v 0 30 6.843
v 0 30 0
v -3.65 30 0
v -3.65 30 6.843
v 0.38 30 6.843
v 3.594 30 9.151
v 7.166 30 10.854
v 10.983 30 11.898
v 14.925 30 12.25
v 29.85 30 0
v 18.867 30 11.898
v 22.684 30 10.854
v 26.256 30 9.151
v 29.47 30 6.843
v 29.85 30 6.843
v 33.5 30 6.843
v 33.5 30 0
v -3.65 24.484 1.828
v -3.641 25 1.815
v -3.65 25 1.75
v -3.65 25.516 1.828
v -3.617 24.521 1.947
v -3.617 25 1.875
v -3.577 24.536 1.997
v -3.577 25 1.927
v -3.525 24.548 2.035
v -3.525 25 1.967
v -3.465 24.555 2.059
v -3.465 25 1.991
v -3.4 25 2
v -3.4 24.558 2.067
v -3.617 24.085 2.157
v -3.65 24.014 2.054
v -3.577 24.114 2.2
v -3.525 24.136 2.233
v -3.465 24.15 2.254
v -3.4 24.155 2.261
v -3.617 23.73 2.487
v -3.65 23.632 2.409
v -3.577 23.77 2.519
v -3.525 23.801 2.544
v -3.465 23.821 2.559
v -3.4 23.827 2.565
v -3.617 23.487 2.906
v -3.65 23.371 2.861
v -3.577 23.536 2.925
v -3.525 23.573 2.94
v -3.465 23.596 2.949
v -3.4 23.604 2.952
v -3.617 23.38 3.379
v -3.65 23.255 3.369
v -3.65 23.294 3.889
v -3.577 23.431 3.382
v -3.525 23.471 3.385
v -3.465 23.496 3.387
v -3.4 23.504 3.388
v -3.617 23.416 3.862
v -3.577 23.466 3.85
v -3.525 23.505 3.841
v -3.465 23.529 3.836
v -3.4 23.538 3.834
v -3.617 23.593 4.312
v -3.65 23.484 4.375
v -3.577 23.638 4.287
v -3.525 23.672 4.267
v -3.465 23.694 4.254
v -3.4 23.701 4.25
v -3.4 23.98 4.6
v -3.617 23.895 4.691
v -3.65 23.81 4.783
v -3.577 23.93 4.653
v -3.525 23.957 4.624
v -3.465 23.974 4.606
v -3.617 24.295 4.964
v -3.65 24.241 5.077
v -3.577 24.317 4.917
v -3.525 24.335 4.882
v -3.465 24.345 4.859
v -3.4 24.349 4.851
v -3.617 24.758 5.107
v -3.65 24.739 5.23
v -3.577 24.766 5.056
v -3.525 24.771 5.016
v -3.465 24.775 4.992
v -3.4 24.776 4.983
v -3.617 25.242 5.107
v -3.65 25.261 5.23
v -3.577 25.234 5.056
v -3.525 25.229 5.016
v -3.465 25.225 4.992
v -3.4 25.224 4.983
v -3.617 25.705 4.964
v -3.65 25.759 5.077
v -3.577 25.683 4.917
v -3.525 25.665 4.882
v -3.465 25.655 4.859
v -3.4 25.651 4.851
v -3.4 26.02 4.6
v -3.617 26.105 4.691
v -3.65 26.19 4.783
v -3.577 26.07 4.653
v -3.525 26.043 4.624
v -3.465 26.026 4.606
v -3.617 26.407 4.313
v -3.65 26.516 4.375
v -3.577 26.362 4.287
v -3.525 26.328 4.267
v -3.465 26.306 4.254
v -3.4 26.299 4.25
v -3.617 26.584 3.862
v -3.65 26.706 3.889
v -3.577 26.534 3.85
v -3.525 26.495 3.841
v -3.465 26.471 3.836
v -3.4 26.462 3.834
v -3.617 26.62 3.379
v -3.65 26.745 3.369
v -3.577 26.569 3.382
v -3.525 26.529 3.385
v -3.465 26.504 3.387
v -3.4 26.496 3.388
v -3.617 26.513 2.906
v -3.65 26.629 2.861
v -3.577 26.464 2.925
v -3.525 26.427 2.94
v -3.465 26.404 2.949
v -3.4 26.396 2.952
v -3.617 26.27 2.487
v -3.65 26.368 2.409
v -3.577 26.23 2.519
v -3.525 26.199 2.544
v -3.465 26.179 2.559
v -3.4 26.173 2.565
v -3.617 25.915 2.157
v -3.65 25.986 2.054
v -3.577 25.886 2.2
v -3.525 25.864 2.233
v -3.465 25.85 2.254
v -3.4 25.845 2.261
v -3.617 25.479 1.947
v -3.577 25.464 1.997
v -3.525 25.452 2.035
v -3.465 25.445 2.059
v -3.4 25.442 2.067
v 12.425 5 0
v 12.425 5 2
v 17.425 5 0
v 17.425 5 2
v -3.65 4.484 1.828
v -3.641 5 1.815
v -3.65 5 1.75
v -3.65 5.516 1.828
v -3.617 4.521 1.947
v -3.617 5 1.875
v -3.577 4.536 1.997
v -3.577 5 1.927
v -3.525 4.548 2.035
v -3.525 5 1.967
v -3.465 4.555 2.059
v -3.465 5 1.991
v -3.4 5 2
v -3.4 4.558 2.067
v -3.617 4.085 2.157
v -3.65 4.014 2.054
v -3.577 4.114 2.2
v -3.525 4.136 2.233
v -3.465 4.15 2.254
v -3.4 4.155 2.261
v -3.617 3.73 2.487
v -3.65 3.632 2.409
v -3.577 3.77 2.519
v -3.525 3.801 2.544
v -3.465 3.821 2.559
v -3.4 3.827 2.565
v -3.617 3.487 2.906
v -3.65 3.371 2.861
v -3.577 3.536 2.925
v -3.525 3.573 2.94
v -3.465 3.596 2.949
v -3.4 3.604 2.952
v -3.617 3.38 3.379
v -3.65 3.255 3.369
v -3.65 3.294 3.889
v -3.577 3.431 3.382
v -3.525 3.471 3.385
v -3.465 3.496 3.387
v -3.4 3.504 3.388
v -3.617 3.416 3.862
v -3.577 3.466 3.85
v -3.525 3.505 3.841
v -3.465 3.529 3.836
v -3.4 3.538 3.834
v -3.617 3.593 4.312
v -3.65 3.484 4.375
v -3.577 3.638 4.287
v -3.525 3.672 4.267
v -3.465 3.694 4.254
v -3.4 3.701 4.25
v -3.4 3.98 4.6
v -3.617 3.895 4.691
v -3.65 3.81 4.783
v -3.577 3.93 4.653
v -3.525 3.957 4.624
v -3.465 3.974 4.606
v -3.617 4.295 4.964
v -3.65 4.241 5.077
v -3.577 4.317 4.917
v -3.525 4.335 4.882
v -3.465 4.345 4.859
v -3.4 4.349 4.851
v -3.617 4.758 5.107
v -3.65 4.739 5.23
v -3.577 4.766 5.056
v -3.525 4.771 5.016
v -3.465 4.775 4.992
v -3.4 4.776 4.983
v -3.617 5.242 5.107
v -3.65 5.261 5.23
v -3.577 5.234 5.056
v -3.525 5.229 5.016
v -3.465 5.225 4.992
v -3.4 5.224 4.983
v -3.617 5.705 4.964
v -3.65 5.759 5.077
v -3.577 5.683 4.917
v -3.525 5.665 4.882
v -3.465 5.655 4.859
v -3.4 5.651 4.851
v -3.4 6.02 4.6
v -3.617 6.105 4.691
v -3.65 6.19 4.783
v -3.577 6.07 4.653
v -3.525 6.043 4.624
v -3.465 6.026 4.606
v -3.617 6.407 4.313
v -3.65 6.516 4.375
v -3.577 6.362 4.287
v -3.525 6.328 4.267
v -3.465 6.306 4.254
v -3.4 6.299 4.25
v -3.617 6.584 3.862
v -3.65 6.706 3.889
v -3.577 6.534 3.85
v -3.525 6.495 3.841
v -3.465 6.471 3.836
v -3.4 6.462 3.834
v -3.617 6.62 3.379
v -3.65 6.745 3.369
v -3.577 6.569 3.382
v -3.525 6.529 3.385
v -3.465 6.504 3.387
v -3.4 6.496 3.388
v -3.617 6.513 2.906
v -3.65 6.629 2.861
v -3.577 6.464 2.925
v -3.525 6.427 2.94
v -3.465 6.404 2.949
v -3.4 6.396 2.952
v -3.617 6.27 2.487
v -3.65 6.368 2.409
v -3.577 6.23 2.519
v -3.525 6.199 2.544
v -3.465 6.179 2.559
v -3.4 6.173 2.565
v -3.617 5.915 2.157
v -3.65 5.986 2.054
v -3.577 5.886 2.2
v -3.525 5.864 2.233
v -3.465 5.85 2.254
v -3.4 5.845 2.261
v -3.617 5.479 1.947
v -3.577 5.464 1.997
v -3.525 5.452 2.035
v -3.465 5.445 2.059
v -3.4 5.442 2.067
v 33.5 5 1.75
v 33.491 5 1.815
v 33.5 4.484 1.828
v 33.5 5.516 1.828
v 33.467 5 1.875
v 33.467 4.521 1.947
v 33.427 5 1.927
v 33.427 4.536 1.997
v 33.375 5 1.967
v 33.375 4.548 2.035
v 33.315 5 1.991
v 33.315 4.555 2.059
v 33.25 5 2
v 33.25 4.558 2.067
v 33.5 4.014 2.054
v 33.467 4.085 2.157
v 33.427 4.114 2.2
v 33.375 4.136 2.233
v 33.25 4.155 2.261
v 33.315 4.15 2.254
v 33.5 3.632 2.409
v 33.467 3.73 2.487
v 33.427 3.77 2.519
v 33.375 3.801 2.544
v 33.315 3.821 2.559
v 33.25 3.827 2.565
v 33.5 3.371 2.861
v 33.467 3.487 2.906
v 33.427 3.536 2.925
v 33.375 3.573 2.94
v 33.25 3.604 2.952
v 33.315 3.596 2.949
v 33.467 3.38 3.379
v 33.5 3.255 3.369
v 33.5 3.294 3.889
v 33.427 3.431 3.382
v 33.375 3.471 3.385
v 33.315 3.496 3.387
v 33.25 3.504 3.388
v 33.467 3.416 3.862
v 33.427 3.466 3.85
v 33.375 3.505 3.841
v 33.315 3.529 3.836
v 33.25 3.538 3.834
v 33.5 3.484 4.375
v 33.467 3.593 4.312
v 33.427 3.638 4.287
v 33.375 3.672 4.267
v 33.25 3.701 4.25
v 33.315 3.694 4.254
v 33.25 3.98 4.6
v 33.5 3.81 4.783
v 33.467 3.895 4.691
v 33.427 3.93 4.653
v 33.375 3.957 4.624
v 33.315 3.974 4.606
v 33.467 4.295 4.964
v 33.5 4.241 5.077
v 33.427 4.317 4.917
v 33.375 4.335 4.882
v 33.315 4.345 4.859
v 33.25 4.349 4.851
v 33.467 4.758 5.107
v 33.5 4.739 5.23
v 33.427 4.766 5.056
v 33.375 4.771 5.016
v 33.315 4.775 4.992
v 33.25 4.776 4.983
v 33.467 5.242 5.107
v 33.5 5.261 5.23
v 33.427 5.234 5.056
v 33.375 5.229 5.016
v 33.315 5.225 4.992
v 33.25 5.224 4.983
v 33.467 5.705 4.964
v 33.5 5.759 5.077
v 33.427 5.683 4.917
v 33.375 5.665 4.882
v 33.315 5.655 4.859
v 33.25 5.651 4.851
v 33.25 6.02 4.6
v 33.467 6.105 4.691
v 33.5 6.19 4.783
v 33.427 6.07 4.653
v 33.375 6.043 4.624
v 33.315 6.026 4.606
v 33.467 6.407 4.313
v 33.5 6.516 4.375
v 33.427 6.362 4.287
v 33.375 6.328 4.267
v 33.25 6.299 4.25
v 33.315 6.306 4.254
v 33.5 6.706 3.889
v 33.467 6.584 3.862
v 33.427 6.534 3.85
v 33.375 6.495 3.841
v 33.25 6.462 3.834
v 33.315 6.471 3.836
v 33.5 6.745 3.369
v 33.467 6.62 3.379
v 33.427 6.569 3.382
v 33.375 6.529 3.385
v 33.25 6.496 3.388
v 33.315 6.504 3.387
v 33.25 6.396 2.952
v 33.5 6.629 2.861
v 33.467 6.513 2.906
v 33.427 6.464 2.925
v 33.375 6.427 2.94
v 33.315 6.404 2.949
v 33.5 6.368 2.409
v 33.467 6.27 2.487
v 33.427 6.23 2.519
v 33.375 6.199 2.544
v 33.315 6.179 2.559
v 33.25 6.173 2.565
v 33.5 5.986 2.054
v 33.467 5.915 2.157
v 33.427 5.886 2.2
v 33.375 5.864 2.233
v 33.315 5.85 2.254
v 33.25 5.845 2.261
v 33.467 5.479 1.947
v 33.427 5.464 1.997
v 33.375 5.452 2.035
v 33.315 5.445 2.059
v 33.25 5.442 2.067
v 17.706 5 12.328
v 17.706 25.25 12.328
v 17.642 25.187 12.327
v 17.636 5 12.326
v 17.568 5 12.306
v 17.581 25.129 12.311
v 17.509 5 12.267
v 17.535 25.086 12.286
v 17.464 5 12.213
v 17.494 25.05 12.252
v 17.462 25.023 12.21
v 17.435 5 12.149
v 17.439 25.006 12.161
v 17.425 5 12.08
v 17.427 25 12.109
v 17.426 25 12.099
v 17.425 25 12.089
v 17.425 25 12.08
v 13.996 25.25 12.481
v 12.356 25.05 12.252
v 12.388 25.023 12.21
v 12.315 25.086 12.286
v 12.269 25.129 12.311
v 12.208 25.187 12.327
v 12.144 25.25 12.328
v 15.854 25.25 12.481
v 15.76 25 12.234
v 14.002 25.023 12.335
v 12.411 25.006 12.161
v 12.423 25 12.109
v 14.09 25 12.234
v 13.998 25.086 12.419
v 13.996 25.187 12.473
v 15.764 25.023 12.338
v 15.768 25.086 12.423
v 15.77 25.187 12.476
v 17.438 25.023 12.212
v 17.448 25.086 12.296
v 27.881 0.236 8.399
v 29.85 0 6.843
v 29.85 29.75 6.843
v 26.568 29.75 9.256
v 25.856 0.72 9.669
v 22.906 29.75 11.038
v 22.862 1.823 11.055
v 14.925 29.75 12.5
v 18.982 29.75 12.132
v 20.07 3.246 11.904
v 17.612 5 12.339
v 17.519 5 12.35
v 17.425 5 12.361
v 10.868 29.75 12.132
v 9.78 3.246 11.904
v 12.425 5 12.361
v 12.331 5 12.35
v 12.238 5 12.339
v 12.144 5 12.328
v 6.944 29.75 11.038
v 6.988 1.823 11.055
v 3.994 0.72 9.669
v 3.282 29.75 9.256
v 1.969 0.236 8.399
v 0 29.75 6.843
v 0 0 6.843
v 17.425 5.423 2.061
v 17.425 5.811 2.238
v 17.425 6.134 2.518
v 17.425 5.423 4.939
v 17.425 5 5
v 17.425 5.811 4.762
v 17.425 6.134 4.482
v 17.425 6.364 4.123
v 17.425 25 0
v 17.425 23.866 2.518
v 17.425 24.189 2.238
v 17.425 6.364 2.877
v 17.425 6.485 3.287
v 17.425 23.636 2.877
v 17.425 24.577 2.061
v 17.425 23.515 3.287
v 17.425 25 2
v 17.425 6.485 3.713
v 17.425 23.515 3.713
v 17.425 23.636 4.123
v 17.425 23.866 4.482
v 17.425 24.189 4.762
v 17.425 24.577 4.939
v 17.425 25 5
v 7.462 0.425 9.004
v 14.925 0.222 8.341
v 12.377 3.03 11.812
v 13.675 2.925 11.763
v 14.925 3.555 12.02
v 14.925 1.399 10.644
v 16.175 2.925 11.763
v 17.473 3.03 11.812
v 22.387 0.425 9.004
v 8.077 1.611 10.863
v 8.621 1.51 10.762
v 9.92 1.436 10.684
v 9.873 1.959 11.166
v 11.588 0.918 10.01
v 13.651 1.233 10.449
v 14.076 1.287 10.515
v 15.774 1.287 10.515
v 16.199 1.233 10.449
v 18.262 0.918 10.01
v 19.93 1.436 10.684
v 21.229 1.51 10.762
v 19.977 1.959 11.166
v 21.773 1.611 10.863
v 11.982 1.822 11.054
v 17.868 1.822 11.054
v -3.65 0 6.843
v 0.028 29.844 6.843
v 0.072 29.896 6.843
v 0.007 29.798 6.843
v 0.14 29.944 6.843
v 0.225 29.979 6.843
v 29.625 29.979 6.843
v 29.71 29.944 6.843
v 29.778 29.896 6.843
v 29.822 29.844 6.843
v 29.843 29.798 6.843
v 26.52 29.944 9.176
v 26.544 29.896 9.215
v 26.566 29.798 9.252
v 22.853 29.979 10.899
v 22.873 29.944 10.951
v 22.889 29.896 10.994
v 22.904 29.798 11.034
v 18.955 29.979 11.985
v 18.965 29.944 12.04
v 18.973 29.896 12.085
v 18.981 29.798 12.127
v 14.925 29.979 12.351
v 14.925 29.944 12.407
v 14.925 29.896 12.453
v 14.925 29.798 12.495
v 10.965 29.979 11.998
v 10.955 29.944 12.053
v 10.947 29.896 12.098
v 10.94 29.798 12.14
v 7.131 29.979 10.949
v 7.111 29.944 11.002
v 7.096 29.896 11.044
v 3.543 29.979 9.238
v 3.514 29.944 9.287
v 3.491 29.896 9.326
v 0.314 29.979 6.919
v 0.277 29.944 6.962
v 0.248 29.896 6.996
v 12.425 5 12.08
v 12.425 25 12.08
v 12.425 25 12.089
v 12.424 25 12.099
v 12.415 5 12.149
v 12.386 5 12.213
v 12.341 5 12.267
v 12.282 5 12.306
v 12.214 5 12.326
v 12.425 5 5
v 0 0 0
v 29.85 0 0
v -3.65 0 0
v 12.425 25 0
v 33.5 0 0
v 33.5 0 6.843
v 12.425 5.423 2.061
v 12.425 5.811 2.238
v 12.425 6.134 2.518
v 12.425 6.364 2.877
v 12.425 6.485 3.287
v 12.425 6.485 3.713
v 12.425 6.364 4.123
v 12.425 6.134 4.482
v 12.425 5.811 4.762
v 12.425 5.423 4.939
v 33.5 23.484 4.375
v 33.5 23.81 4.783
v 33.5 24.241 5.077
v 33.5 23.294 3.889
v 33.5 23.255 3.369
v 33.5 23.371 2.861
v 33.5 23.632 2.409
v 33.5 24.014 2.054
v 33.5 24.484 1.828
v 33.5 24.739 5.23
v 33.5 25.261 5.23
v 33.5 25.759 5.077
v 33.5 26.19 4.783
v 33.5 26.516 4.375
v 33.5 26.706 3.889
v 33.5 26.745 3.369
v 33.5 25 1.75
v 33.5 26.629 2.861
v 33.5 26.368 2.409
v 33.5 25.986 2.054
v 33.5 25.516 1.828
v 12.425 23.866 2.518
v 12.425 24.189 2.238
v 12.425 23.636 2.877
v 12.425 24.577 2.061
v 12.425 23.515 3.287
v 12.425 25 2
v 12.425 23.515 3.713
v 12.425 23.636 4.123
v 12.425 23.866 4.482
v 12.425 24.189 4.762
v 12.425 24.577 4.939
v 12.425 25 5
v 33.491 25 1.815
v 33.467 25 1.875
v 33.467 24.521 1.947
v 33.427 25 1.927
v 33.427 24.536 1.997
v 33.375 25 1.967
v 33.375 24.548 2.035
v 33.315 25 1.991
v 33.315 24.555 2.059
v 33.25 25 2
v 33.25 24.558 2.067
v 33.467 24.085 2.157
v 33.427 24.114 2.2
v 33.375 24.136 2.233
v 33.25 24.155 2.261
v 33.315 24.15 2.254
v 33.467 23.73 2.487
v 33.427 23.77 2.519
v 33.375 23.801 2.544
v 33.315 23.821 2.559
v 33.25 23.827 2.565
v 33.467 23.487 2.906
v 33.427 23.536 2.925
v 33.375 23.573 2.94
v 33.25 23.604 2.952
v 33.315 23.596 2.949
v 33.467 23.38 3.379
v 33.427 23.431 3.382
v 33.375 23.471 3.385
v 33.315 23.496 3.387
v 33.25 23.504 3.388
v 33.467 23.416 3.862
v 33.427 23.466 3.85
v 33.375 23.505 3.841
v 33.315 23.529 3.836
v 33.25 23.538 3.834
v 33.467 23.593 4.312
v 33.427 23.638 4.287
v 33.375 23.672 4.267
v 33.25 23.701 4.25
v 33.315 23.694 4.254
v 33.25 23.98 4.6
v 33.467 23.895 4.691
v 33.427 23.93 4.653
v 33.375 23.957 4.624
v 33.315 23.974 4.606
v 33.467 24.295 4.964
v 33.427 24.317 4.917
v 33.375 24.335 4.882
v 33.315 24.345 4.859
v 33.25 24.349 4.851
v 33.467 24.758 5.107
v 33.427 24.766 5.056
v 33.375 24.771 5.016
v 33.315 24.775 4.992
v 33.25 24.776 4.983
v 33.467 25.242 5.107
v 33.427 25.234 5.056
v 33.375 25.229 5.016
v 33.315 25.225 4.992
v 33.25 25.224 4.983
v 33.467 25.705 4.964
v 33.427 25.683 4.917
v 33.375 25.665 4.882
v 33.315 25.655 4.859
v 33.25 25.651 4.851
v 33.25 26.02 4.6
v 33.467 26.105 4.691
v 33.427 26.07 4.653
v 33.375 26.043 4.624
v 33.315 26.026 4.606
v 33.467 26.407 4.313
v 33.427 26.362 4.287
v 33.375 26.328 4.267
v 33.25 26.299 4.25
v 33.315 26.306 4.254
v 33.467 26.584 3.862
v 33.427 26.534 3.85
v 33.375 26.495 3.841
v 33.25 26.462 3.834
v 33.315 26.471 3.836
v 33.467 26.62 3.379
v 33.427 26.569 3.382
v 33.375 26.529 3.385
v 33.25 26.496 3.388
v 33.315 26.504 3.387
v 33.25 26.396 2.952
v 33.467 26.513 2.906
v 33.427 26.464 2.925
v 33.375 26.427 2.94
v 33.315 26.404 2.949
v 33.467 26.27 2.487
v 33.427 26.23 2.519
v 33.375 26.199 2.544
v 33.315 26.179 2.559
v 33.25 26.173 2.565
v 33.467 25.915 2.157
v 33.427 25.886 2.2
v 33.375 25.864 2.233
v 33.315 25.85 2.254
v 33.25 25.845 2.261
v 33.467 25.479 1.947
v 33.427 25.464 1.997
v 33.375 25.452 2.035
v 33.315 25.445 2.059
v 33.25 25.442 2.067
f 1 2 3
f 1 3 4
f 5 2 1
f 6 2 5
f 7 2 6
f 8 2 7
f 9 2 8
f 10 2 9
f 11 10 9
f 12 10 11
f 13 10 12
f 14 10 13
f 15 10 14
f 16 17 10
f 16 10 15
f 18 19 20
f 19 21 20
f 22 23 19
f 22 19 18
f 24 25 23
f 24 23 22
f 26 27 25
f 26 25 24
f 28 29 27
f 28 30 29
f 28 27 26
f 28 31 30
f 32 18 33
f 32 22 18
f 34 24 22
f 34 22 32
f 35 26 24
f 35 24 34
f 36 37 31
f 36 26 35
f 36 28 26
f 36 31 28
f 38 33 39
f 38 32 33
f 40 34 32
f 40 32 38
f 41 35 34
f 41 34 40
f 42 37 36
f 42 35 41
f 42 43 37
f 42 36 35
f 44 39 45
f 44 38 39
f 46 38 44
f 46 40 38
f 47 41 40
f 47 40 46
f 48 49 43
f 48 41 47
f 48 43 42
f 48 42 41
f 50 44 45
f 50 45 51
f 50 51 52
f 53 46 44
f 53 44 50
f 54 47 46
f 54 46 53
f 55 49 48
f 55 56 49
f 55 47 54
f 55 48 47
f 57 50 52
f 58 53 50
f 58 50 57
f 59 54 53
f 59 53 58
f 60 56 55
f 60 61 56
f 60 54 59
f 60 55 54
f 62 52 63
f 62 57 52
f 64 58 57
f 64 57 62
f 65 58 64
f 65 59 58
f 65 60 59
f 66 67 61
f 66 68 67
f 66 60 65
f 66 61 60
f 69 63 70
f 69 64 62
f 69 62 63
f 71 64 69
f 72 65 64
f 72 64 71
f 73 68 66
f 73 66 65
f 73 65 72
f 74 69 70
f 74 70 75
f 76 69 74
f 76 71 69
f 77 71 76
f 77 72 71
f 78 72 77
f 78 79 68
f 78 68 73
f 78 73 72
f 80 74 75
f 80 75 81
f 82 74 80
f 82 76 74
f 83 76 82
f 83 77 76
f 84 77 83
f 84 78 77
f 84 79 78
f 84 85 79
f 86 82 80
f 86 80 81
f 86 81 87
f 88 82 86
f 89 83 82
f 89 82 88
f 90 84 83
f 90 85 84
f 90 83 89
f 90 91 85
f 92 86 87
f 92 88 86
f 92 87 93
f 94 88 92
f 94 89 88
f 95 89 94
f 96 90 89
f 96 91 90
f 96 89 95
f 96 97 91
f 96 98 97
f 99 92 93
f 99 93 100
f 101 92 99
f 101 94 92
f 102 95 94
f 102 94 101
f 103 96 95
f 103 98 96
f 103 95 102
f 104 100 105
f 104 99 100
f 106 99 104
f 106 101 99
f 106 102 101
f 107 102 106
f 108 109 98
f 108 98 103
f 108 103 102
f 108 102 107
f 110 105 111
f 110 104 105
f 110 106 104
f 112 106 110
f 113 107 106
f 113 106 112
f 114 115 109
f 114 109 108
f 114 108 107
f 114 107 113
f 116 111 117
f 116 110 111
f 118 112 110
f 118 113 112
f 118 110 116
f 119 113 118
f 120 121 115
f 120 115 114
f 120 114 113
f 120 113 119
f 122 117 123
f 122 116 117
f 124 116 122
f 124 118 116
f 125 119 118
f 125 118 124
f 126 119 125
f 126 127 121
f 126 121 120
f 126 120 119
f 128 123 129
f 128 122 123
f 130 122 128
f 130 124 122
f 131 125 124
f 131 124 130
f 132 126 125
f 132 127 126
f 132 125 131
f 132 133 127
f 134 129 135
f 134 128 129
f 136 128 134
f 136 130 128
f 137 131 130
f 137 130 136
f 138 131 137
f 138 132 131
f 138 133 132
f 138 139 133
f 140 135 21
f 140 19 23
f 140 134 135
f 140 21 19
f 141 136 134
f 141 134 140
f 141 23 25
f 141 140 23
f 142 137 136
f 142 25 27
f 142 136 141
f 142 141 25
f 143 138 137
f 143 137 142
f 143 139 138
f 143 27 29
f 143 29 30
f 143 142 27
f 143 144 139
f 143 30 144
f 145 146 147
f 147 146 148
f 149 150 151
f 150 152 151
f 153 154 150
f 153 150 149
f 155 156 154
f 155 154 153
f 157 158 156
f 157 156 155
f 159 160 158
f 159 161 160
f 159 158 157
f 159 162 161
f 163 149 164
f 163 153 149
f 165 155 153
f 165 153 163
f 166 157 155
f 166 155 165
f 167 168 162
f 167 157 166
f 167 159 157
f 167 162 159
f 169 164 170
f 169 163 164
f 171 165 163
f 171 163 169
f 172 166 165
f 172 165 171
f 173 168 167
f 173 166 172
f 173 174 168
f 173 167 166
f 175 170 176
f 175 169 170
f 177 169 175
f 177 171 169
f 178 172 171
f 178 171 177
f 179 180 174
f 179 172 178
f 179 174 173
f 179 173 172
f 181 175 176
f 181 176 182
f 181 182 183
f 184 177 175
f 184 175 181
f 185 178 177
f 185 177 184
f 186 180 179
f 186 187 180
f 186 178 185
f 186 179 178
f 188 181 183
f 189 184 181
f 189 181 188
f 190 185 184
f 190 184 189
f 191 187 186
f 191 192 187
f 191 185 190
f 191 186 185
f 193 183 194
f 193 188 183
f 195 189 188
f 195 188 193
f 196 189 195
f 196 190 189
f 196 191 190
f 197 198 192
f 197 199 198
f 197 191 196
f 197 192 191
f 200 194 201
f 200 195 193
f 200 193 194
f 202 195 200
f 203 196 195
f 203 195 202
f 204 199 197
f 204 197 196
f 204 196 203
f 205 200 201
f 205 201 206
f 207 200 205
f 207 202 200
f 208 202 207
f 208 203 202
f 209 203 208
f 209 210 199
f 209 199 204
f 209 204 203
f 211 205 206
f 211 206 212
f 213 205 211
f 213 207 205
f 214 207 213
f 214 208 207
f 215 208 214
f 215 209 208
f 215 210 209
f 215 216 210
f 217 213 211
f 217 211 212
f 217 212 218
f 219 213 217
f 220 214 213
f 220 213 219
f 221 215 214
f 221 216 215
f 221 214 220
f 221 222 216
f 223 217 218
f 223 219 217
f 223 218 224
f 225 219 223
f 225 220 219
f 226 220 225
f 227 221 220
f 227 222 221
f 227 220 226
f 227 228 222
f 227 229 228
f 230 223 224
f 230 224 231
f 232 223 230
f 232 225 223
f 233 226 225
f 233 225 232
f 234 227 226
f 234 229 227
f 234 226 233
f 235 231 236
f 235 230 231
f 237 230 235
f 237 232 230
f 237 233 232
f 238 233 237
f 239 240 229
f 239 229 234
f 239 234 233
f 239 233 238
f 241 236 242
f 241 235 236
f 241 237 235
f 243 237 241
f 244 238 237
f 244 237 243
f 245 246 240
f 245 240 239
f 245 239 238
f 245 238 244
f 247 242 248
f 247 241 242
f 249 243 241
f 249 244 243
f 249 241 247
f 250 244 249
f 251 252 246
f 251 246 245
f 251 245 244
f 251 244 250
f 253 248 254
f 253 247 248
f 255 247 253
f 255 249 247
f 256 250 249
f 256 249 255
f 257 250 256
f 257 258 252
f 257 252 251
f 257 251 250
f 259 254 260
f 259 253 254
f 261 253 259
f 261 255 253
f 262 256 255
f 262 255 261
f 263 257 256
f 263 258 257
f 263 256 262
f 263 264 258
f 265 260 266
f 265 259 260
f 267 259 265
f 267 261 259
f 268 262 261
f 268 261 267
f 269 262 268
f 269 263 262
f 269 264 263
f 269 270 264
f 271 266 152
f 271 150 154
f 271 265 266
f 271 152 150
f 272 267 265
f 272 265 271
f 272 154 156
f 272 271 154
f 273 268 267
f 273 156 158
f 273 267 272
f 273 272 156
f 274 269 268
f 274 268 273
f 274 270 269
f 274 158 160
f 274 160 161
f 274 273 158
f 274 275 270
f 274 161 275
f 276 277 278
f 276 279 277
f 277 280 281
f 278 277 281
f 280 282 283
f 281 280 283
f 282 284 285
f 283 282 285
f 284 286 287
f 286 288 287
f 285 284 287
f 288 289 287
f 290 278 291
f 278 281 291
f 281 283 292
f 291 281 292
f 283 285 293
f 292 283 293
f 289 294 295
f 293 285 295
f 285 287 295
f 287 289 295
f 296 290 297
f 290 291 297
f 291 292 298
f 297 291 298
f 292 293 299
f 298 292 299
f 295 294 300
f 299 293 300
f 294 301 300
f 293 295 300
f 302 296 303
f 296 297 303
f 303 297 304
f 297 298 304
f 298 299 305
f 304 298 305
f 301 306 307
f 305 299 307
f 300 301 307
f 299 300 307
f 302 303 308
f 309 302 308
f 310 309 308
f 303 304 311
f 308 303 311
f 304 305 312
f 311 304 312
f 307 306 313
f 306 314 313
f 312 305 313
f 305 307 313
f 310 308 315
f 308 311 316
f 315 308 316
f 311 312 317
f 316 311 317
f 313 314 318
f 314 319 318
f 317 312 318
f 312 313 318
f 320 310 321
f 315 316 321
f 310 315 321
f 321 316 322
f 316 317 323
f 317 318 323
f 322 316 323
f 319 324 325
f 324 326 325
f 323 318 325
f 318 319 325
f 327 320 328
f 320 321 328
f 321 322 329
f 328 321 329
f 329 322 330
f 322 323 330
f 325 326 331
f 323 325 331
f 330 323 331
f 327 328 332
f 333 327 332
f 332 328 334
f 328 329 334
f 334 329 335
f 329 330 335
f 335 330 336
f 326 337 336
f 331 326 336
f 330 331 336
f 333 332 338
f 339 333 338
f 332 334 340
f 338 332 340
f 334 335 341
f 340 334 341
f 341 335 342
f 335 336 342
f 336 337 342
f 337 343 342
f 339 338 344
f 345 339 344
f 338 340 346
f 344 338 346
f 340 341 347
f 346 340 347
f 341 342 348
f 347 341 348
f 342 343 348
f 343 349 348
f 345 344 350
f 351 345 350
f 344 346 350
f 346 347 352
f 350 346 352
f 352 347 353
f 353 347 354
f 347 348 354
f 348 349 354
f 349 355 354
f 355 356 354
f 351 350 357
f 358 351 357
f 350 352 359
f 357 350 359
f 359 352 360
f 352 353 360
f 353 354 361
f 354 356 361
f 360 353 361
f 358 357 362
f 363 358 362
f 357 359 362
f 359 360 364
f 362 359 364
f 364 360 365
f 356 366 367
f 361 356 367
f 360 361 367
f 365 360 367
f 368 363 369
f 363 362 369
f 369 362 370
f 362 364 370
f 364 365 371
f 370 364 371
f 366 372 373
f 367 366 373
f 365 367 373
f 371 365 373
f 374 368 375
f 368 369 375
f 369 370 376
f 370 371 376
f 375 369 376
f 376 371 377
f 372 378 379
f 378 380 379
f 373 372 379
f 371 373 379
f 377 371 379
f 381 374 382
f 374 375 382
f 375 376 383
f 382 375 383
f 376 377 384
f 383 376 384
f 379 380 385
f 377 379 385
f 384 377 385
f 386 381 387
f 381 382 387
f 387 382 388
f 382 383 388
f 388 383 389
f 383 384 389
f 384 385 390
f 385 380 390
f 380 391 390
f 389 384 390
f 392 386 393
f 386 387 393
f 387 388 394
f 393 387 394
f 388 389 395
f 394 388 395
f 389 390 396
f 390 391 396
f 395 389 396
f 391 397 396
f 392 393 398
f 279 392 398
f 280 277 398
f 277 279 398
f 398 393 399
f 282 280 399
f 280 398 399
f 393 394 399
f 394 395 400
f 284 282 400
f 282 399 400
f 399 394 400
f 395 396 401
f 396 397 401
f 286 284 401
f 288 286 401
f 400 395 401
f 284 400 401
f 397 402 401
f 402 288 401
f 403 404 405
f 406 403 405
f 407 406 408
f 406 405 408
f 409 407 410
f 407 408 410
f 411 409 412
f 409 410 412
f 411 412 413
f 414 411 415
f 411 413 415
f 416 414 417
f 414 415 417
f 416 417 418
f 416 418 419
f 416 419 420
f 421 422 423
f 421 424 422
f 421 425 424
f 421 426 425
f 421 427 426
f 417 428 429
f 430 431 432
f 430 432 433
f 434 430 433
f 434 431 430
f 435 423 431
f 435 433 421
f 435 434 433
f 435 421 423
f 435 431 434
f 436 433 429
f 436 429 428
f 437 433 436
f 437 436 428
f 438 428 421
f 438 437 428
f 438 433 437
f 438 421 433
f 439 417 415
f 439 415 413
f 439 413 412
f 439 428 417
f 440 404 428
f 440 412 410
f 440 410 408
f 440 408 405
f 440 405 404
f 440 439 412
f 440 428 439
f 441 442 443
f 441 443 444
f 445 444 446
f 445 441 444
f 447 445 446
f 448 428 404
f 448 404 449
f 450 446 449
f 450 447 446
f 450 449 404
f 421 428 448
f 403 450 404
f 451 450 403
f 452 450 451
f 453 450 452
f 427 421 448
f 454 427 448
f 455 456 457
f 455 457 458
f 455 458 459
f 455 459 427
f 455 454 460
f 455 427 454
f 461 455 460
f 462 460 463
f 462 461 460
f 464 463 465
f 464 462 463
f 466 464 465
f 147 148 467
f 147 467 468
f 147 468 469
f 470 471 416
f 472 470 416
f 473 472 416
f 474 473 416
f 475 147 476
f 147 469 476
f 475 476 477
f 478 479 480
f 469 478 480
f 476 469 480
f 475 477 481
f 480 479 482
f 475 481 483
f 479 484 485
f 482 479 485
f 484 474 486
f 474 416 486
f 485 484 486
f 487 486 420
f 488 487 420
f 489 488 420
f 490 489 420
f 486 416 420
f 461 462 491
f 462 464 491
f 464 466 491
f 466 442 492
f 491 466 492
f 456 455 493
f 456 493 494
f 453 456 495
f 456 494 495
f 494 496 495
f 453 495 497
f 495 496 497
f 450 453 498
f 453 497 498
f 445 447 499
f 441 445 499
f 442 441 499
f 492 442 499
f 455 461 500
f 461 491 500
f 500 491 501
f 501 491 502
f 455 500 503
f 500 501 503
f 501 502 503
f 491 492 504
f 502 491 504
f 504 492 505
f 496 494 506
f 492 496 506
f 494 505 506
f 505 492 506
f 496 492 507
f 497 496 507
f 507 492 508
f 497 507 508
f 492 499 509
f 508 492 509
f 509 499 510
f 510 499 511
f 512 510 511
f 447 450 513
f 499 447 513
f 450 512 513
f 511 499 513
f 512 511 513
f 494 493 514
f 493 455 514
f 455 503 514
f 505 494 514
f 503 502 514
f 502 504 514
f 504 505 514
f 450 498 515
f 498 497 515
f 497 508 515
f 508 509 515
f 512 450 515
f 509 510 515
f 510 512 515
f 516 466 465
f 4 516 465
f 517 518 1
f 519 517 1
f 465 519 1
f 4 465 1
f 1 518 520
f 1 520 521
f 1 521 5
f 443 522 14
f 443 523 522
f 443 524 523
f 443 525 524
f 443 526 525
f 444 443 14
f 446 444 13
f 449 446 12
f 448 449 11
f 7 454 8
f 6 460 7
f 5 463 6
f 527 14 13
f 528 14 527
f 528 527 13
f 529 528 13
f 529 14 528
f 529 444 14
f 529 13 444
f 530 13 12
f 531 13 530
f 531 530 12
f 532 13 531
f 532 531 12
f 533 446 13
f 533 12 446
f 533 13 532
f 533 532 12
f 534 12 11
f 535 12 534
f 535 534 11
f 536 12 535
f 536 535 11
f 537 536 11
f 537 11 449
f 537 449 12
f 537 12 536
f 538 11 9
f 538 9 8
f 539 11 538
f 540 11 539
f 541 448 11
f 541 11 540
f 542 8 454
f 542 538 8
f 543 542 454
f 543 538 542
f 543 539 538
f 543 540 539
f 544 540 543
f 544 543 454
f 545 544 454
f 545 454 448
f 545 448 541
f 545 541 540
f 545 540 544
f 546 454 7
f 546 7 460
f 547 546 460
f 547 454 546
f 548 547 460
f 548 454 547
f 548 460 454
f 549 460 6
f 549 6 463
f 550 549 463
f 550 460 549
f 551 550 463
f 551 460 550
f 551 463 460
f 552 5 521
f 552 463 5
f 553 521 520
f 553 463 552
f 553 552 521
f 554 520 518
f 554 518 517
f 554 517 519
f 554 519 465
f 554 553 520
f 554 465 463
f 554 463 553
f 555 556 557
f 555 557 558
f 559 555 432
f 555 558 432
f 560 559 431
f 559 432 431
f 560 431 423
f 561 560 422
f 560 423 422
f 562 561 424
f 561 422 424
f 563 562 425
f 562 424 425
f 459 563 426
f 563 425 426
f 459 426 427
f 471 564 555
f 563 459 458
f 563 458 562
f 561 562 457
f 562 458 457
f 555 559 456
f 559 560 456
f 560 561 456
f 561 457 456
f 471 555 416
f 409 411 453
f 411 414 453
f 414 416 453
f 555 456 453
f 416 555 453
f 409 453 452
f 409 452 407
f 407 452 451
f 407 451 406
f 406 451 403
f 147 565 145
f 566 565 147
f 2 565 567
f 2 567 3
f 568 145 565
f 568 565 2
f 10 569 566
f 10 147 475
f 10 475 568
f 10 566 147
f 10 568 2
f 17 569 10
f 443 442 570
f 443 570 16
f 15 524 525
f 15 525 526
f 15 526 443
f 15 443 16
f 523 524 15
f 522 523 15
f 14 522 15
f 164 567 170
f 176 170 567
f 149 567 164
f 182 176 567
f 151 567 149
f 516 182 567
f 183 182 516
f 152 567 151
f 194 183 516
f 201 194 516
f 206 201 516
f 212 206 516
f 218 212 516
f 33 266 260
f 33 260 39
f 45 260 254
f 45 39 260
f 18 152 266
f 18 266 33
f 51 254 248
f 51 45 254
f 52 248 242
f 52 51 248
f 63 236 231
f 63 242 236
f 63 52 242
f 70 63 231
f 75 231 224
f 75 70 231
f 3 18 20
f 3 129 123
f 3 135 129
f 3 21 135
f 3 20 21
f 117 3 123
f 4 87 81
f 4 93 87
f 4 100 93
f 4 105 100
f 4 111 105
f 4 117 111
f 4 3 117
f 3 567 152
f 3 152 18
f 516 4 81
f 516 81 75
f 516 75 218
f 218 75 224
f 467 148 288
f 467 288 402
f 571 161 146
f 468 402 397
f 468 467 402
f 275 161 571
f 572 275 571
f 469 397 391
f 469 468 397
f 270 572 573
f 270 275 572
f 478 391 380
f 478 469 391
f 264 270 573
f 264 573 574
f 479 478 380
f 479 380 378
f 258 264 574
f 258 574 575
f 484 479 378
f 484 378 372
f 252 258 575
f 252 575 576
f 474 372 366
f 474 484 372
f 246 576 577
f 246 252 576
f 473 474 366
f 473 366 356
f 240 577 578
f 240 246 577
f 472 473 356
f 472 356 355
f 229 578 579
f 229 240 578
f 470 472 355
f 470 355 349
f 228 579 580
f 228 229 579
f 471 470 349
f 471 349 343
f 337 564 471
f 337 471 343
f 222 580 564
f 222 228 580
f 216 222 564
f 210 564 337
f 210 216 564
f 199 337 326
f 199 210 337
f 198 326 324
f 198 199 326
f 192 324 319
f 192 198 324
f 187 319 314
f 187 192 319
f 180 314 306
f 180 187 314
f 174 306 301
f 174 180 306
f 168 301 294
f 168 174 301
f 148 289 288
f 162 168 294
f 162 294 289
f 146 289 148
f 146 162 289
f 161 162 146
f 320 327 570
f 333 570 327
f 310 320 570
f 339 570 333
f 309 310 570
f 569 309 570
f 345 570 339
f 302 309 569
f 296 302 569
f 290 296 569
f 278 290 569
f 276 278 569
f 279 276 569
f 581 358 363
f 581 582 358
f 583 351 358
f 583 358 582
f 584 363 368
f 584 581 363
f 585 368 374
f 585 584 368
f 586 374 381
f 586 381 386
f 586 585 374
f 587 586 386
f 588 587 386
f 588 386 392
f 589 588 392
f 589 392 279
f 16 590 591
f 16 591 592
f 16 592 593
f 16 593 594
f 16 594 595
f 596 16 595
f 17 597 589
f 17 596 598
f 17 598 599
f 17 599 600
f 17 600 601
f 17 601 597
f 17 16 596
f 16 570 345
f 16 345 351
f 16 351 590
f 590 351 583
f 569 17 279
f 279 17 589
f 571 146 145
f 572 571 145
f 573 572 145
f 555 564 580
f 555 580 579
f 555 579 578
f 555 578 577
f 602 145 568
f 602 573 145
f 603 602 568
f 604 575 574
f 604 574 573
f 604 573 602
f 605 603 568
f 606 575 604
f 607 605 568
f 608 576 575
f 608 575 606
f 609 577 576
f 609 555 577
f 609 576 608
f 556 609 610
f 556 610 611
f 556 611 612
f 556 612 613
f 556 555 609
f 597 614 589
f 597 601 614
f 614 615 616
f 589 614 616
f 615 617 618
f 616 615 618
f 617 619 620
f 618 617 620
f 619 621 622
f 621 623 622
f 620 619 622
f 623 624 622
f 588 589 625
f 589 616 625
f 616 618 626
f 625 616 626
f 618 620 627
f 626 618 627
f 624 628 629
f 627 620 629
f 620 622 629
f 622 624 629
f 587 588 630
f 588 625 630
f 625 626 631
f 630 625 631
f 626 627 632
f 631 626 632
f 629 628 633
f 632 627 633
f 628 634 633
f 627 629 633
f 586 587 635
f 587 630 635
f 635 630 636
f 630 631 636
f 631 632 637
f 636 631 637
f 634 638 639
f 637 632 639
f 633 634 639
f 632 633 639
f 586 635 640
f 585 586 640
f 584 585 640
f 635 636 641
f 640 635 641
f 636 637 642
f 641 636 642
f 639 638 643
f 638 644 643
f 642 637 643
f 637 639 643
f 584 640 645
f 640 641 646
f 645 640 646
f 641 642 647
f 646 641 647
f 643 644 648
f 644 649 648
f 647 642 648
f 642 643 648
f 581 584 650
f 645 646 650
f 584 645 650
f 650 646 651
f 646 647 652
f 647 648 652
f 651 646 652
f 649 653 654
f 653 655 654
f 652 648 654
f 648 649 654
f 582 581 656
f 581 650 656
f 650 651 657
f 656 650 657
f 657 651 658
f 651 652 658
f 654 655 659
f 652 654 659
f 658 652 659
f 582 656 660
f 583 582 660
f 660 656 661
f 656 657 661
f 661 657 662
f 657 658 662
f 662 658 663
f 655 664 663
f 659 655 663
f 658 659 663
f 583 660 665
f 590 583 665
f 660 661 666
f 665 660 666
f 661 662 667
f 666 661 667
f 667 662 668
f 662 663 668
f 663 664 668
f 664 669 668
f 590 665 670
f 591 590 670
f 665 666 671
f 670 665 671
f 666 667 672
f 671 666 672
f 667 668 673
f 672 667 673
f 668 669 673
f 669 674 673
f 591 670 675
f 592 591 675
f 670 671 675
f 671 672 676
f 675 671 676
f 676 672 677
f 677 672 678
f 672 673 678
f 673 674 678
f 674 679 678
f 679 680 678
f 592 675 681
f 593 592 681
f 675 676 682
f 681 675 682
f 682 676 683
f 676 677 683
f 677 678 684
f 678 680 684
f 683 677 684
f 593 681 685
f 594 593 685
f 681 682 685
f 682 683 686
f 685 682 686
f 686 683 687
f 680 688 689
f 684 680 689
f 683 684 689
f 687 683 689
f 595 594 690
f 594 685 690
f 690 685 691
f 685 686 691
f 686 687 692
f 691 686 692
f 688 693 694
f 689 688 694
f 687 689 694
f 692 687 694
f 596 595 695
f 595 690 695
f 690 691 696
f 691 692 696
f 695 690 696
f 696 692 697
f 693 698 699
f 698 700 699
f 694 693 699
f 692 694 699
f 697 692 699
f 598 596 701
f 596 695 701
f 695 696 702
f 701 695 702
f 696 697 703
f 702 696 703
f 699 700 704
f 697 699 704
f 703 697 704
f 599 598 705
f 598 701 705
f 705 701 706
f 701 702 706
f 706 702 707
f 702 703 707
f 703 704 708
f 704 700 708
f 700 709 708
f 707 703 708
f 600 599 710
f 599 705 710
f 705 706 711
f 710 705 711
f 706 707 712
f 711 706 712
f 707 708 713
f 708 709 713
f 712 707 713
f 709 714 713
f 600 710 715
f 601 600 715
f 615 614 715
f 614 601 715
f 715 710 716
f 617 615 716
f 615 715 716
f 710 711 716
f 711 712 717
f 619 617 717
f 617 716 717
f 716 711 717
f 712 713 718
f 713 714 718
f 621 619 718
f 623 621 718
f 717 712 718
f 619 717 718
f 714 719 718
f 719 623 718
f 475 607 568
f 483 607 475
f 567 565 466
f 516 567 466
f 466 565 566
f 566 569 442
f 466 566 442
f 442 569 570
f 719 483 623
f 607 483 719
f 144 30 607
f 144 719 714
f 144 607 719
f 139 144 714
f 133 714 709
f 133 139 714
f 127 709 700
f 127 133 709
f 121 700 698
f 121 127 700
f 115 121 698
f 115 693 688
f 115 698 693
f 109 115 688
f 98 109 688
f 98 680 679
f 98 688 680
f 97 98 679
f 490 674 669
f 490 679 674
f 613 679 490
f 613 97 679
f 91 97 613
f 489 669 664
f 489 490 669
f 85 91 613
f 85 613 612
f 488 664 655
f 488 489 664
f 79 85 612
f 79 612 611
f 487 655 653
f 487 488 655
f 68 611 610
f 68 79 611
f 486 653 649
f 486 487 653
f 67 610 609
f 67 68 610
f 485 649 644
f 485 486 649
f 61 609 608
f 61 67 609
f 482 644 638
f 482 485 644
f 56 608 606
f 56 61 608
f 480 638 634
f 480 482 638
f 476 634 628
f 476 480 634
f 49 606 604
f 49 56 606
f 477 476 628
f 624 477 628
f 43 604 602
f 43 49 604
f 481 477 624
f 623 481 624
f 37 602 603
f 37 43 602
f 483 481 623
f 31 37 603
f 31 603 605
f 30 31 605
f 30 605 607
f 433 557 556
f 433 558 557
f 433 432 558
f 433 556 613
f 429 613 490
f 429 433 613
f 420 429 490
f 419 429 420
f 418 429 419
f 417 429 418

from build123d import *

# Parameters (mm, degrees)
SKETCH1_W               = 29.85
SKETCH1_H               = 30
BOSS_EXTRUDE1_DEPTH     = 12.5
SKETCH2_W               = 5
SKETCH2_H               = 20
CUT_EXTRUDE1_DEPTH      = 45.127910669
CUT_EXTRUDE3_DEPTH      = 45.127910669
CUT_EXTRUDE5_DEPTH      = 45.127910669
SKETCH8_W               = 6.842575397
SKETCH8_H               = 30
BOSS_EXTRUDE5_DEPTH     = 3.65
SKETCH9_W               = 6.842575397
SKETCH9_H               = 30
BOSS_EXTRUDE6_DEPTH     = 3.65
CUT_EXTRUDE7_DEPTH      = 47.674404212
CUT_EXTRUDE7_DEPTH_BACK = 47.674404212
SKETCH4_R               = 1.5
FILLET17_R              = 0.25
FILLET19_R              = 0.25


with BuildPart() as part:
    # Sketch1 → Boss-Extrude1 (new body)
    with BuildSketch(Plane.XY):
        with Locations((14.925, 15)):
            Rectangle(SKETCH1_W, SKETCH1_H)
    extrude(amount=BOSS_EXTRUDE1_DEPTH)

    # Sketch2 → Cut-Extrude1 (cut, through all)
    with BuildSketch(Plane.XY.offset(12.5)):
        with Locations((14.925, 15)):
            Rectangle(SKETCH2_W, SKETCH2_H)
    extrude(amount=-CUT_EXTRUDE1_DEPTH, mode=Mode.SUBTRACT)

    # Sketch5 → Cut-Extrude3 (cut, through all)
    with BuildSketch(Plane.XZ):
        with BuildLine():
            Line((0, 6.842575397), (-5.709638119, 18.35105476))
            Line((-5.709638119, 18.35105476), (14.925, 23.822049063))
            Line((14.925, 23.822049063), (34.386752026, 18.35105476))
            Line((34.386752026, 18.35105476), (29.85, 6.842575397))
            ThreePointArc((29.85, 6.842575397), (14.925, 12.5), (0, 6.842575397))
        make_face()
    extrude(amount=-CUT_EXTRUDE3_DEPTH, mode=Mode.SUBTRACT)

    # Sketch7 → Cut-Extrude5 (cut, through all)
    with BuildSketch(Plane(origin=(29.85, 0, 0), x_dir=(0, 0, -1), z_dir=(1, 0, 0))):
        with BuildLine():
            Line((-6.842575397, 0), (-6.842575397, -1.983675783))
            Line((-6.842575397, -1.983675783), (-14.601311023, -1.983675783))
            Line((-14.601311023, -1.983675783), (-14.601311023, 5))
            Line((-14.601311023, 5), (-12.360777707, 5))
            add(Edge.make_bspline(
                [(-6.842575397, 0), (-11.686120983, 0.298823628), (-12.360777707, 5)],
                knots=[0, 0, 0, 1, 1, 1], degree=2))
        make_face()
    extrude(amount=-CUT_EXTRUDE5_DEPTH, mode=Mode.SUBTRACT)

    # Sketch8 → Boss-Extrude5 (add)
    with BuildSketch(Plane(origin=(29.85, 0, 0), x_dir=(0, 0, -1), z_dir=(1, 0, 0))):
        with Locations((-3.421287699, 15)):
            Rectangle(SKETCH8_W, SKETCH8_H)
    extrude(amount=BOSS_EXTRUDE5_DEPTH)

    # Sketch9 → Boss-Extrude6 (add)
    with BuildSketch(Plane.ZY):
        with Locations((3.421287699, 15)):
            Rectangle(SKETCH9_W, SKETCH9_H)
    extrude(amount=BOSS_EXTRUDE6_DEPTH)

    # Sketch4 → Cut-Extrude7 (cut, two sides: drawn at the far end of the back side and taken through both)
    with BuildSketch(Plane(origin=(29.85, 0, 0), x_dir=(0, 0, -1), z_dir=(1, 0, 0)).offset(-CUT_EXTRUDE7_DEPTH_BACK)):
        with Locations((-3.5, 25)):
            Circle(SKETCH4_R)
        with Locations((-3.5, 5)):
            Circle(SKETCH4_R)
    extrude(amount=CUT_EXTRUDE7_DEPTH + CUT_EXTRUDE7_DEPTH_BACK, mode=Mode.SUBTRACT)

    # Fillet17
    fillet17_edges = [part.edges().sort_by_distance(p)[0] for p in [
        (-3.65, 25, 5),
        (33.5, 25, 5),
        (-3.65, 5, 5),
        (33.5, 5, 5),
    ]]
    fillet(fillet17_edges, radius=FILLET17_R)

    # Fillet19
    # the kernel refuses this fillet: 0.25 mm, written as the material it takes off along each edge
    with BuildSketch(Plane(origin=(17.425, 25, 12.360777707), x_dir=(0.9930996963041147, 0, -0.11727315635163624), z_dir=(0, -1, 0))) as fillet19_piece_1:
        with BuildLine():
            CenterArc((0.28125848, -0.249995069), FILLET19_R, 89.640140573, 97.094614091)
            Line((0.032983556, -0.279313358), (0, 0))
            ThreePointArc((0, 0), (0.141414326, 0.000444094), (0.282828652, 0))
        make_face()
    extrude(amount=20, mode=Mode.SUBTRACT)
    with BuildSketch(Plane(origin=(14.925, 25, -10.015728977), x_dir=(-0.13857412950442824, 0, 0.9903520639813349), z_dir=(-0.9903520639813349, 0, -0.13857412950442824))) as fillet19_piece_2_section:
        with BuildLine():
            CenterArc((22.515728977 - FILLET19_R, FILLET19_R), FILLET19_R, 270, 90)
            Line((22.515728977 - FILLET19_R, 0), (22.515728977, 0))
            Line((22.515728977, 0), (22.515728977, FILLET19_R))
        make_face()
    fillet19_piece_2 = revolve(axis=Axis((14.925, 25, -10.015728977), (0, 1, 0)), revolution_arc=15.930691333, mode=Mode.PRIVATE)
    fillet19_piece_2 = split(fillet19_piece_2, bisect_by=Plane(origin=(12.425, 25.070178335, 12.429821665), z_dir=(1, 0, 0)), keep=Keep.TOP, mode=Mode.PRIVATE)
    fillet19_piece_2 = split(fillet19_piece_2, bisect_by=Plane(origin=(17.425, 25.070178335, 12.429821665), z_dir=(-1, 0, 0)), keep=Keep.TOP, mode=Mode.PRIVATE)
    add(fillet19_piece_2, mode=Mode.SUBTRACT)
    with BuildSketch(Plane(origin=(14.925, 30, -10.015728977), x_dir=(0.6834024940823613, 0, 0.7300418009141724), z_dir=(0.7300418009141724, 0, -0.6834024940823613))) as fillet19_piece_3_section:
        with BuildLine():
            CenterArc((22.515728977 - FILLET19_R, FILLET19_R), FILLET19_R, 270, 90)
            Line((22.515728977, FILLET19_R), (22.515728977, 0))
            Line((22.515728977, 0), (22.515728977 - FILLET19_R, 0))
        make_face()
    fillet19_piece_3 = revolve(axis=Axis((14.925, 30, -10.015728977), (0, -1, 0)), revolution_arc=86.220203027, mode=Mode.PRIVATE)
    fillet19_piece_3 = split(fillet19_piece_3, bisect_by=Plane(origin=(14.925, 29.93245071, 6.842575397), z_dir=(0, 0, 1)), keep=Keep.TOP, mode=Mode.PRIVATE)
    add(fillet19_piece_3, mode=Mode.SUBTRACT)
    with BuildSketch(Plane(origin=(12.425, 25, 12.360777707), x_dir=(-0.9930996963041147, 0, -0.1172731563516355), z_dir=(0, -1, 0))) as fillet19_piece_4:
        with BuildLine():
            CenterArc((0.28125848, 0.249995069), FILLET19_R, 173.265245336, 97.094614091)
            Line((0.032983556, 0.279313358), (0, 0))
            ThreePointArc((0, 0), (0.141414326, -0.000444094), (0.282828652, 0))
        make_face()
    extrude(amount=20, mode=Mode.SUBTRACT)
    with BuildSketch(Plane(origin=(17.425, 25.707071631, 12.360777707), x_dir=(0.9930996963041131, 0, -0.11727315635164862), z_dir=(0, -1, 0))) as fillet19_piece_5a_section:
        with BuildLine():
            CenterArc((0.28125848, -0.249995069), FILLET19_R, 89.640140573, 97.094614091)
            Line((0.032983556, -0.279313358), (0, 0))
            ThreePointArc((0, 0), (0.141414326, 0.000444094), (0.282828652, 0))
        make_face()
    fillet19_piece_5a = extrude(amount=20.707071631, mode=Mode.PRIVATE)
    fillet19_piece_5a = split(fillet19_piece_5a, bisect_by=Plane(origin=(17.489598012, 25, 12.288810309), z_dir=(0, 1, 0)), keep=Keep.TOP, mode=Mode.PRIVATE)
    with BuildSketch(Plane(origin=(14.925, 25, -10.015728977), x_dir=(-0.13857412950442824, 0, 0.9903520639813349), z_dir=(-0.9903520639813349, 0, -0.13857412950442824))) as fillet19_piece_5b_section:
        with BuildLine():
            CenterArc((22.515728977 - FILLET19_R, FILLET19_R), FILLET19_R, 270, 90)
            Line((22.515728977 - FILLET19_R, 0), (22.515728977, 0))
            Line((22.515728977, 0), (22.515728977, FILLET19_R))
        make_face()
    fillet19_piece_5b = revolve(axis=Axis((14.925, 25, -10.015728977), (0, 1, 0)), revolution_arc=15.930691333, mode=Mode.PRIVATE)
    fillet19_piece_5b = split(fillet19_piece_5b, bisect_by=Plane(origin=(17.425, 25.056986655, 12.26732893), z_dir=(1, 0, 0)), keep=Keep.TOP, mode=Mode.PRIVATE)
    fillet19_piece_5 = fillet19_piece_5a & fillet19_piece_5b
    add(fillet19_piece_5, mode=Mode.SUBTRACT)
    with BuildSketch(Plane(origin=(14.925, 25, -10.015728977), x_dir=(-0.13857412950442824, 0, 0.9903520639813349), z_dir=(-0.9903520639813349, 0, -0.13857412950442824))) as fillet19_piece_6a_section:
        with BuildLine():
            CenterArc((22.515728977 - FILLET19_R, FILLET19_R), FILLET19_R, 270, 90)
            Line((22.515728977 - FILLET19_R, 0), (22.515728977, 0))
            Line((22.515728977, 0), (22.515728977, FILLET19_R))
        make_face()
    fillet19_piece_6a = revolve(axis=Axis((14.925, 25, -10.015728977), (0, 1, 0)), revolution_arc=15.930691333, mode=Mode.PRIVATE)
    fillet19_piece_6a = split(fillet19_piece_6a, bisect_by=Plane(origin=(12.425, 25.056986602, 12.267328652), z_dir=(-1, 0, 0)), keep=Keep.TOP, mode=Mode.PRIVATE)
    with BuildSketch(Plane(origin=(12.425, 25.707071631, 12.360777707), x_dir=(-0.9930996963041131, 0, -0.11727315635164788), z_dir=(0, -1, 0))) as fillet19_piece_6b_section:
        with BuildLine():
            CenterArc((0.28125848, 0.249995069), FILLET19_R, 173.265245336, 97.094614091)
            Line((0.032983556, 0.279313358), (0, 0))
            ThreePointArc((0, 0), (0.141414326, -0.000444094), (0.282828652, 0))
        make_face()
    fillet19_piece_6b = extrude(amount=20.707071631, mode=Mode.PRIVATE)
    fillet19_piece_6b = split(fillet19_piece_6b, bisect_by=Plane(origin=(12.360401988, 25, 12.288810309), z_dir=(0, 1, 0)), keep=Keep.TOP, mode=Mode.PRIVATE)
    fillet19_piece_6 = fillet19_piece_6a & fillet19_piece_6b
    add(fillet19_piece_6, mode=Mode.SUBTRACT)


solid = part.part
